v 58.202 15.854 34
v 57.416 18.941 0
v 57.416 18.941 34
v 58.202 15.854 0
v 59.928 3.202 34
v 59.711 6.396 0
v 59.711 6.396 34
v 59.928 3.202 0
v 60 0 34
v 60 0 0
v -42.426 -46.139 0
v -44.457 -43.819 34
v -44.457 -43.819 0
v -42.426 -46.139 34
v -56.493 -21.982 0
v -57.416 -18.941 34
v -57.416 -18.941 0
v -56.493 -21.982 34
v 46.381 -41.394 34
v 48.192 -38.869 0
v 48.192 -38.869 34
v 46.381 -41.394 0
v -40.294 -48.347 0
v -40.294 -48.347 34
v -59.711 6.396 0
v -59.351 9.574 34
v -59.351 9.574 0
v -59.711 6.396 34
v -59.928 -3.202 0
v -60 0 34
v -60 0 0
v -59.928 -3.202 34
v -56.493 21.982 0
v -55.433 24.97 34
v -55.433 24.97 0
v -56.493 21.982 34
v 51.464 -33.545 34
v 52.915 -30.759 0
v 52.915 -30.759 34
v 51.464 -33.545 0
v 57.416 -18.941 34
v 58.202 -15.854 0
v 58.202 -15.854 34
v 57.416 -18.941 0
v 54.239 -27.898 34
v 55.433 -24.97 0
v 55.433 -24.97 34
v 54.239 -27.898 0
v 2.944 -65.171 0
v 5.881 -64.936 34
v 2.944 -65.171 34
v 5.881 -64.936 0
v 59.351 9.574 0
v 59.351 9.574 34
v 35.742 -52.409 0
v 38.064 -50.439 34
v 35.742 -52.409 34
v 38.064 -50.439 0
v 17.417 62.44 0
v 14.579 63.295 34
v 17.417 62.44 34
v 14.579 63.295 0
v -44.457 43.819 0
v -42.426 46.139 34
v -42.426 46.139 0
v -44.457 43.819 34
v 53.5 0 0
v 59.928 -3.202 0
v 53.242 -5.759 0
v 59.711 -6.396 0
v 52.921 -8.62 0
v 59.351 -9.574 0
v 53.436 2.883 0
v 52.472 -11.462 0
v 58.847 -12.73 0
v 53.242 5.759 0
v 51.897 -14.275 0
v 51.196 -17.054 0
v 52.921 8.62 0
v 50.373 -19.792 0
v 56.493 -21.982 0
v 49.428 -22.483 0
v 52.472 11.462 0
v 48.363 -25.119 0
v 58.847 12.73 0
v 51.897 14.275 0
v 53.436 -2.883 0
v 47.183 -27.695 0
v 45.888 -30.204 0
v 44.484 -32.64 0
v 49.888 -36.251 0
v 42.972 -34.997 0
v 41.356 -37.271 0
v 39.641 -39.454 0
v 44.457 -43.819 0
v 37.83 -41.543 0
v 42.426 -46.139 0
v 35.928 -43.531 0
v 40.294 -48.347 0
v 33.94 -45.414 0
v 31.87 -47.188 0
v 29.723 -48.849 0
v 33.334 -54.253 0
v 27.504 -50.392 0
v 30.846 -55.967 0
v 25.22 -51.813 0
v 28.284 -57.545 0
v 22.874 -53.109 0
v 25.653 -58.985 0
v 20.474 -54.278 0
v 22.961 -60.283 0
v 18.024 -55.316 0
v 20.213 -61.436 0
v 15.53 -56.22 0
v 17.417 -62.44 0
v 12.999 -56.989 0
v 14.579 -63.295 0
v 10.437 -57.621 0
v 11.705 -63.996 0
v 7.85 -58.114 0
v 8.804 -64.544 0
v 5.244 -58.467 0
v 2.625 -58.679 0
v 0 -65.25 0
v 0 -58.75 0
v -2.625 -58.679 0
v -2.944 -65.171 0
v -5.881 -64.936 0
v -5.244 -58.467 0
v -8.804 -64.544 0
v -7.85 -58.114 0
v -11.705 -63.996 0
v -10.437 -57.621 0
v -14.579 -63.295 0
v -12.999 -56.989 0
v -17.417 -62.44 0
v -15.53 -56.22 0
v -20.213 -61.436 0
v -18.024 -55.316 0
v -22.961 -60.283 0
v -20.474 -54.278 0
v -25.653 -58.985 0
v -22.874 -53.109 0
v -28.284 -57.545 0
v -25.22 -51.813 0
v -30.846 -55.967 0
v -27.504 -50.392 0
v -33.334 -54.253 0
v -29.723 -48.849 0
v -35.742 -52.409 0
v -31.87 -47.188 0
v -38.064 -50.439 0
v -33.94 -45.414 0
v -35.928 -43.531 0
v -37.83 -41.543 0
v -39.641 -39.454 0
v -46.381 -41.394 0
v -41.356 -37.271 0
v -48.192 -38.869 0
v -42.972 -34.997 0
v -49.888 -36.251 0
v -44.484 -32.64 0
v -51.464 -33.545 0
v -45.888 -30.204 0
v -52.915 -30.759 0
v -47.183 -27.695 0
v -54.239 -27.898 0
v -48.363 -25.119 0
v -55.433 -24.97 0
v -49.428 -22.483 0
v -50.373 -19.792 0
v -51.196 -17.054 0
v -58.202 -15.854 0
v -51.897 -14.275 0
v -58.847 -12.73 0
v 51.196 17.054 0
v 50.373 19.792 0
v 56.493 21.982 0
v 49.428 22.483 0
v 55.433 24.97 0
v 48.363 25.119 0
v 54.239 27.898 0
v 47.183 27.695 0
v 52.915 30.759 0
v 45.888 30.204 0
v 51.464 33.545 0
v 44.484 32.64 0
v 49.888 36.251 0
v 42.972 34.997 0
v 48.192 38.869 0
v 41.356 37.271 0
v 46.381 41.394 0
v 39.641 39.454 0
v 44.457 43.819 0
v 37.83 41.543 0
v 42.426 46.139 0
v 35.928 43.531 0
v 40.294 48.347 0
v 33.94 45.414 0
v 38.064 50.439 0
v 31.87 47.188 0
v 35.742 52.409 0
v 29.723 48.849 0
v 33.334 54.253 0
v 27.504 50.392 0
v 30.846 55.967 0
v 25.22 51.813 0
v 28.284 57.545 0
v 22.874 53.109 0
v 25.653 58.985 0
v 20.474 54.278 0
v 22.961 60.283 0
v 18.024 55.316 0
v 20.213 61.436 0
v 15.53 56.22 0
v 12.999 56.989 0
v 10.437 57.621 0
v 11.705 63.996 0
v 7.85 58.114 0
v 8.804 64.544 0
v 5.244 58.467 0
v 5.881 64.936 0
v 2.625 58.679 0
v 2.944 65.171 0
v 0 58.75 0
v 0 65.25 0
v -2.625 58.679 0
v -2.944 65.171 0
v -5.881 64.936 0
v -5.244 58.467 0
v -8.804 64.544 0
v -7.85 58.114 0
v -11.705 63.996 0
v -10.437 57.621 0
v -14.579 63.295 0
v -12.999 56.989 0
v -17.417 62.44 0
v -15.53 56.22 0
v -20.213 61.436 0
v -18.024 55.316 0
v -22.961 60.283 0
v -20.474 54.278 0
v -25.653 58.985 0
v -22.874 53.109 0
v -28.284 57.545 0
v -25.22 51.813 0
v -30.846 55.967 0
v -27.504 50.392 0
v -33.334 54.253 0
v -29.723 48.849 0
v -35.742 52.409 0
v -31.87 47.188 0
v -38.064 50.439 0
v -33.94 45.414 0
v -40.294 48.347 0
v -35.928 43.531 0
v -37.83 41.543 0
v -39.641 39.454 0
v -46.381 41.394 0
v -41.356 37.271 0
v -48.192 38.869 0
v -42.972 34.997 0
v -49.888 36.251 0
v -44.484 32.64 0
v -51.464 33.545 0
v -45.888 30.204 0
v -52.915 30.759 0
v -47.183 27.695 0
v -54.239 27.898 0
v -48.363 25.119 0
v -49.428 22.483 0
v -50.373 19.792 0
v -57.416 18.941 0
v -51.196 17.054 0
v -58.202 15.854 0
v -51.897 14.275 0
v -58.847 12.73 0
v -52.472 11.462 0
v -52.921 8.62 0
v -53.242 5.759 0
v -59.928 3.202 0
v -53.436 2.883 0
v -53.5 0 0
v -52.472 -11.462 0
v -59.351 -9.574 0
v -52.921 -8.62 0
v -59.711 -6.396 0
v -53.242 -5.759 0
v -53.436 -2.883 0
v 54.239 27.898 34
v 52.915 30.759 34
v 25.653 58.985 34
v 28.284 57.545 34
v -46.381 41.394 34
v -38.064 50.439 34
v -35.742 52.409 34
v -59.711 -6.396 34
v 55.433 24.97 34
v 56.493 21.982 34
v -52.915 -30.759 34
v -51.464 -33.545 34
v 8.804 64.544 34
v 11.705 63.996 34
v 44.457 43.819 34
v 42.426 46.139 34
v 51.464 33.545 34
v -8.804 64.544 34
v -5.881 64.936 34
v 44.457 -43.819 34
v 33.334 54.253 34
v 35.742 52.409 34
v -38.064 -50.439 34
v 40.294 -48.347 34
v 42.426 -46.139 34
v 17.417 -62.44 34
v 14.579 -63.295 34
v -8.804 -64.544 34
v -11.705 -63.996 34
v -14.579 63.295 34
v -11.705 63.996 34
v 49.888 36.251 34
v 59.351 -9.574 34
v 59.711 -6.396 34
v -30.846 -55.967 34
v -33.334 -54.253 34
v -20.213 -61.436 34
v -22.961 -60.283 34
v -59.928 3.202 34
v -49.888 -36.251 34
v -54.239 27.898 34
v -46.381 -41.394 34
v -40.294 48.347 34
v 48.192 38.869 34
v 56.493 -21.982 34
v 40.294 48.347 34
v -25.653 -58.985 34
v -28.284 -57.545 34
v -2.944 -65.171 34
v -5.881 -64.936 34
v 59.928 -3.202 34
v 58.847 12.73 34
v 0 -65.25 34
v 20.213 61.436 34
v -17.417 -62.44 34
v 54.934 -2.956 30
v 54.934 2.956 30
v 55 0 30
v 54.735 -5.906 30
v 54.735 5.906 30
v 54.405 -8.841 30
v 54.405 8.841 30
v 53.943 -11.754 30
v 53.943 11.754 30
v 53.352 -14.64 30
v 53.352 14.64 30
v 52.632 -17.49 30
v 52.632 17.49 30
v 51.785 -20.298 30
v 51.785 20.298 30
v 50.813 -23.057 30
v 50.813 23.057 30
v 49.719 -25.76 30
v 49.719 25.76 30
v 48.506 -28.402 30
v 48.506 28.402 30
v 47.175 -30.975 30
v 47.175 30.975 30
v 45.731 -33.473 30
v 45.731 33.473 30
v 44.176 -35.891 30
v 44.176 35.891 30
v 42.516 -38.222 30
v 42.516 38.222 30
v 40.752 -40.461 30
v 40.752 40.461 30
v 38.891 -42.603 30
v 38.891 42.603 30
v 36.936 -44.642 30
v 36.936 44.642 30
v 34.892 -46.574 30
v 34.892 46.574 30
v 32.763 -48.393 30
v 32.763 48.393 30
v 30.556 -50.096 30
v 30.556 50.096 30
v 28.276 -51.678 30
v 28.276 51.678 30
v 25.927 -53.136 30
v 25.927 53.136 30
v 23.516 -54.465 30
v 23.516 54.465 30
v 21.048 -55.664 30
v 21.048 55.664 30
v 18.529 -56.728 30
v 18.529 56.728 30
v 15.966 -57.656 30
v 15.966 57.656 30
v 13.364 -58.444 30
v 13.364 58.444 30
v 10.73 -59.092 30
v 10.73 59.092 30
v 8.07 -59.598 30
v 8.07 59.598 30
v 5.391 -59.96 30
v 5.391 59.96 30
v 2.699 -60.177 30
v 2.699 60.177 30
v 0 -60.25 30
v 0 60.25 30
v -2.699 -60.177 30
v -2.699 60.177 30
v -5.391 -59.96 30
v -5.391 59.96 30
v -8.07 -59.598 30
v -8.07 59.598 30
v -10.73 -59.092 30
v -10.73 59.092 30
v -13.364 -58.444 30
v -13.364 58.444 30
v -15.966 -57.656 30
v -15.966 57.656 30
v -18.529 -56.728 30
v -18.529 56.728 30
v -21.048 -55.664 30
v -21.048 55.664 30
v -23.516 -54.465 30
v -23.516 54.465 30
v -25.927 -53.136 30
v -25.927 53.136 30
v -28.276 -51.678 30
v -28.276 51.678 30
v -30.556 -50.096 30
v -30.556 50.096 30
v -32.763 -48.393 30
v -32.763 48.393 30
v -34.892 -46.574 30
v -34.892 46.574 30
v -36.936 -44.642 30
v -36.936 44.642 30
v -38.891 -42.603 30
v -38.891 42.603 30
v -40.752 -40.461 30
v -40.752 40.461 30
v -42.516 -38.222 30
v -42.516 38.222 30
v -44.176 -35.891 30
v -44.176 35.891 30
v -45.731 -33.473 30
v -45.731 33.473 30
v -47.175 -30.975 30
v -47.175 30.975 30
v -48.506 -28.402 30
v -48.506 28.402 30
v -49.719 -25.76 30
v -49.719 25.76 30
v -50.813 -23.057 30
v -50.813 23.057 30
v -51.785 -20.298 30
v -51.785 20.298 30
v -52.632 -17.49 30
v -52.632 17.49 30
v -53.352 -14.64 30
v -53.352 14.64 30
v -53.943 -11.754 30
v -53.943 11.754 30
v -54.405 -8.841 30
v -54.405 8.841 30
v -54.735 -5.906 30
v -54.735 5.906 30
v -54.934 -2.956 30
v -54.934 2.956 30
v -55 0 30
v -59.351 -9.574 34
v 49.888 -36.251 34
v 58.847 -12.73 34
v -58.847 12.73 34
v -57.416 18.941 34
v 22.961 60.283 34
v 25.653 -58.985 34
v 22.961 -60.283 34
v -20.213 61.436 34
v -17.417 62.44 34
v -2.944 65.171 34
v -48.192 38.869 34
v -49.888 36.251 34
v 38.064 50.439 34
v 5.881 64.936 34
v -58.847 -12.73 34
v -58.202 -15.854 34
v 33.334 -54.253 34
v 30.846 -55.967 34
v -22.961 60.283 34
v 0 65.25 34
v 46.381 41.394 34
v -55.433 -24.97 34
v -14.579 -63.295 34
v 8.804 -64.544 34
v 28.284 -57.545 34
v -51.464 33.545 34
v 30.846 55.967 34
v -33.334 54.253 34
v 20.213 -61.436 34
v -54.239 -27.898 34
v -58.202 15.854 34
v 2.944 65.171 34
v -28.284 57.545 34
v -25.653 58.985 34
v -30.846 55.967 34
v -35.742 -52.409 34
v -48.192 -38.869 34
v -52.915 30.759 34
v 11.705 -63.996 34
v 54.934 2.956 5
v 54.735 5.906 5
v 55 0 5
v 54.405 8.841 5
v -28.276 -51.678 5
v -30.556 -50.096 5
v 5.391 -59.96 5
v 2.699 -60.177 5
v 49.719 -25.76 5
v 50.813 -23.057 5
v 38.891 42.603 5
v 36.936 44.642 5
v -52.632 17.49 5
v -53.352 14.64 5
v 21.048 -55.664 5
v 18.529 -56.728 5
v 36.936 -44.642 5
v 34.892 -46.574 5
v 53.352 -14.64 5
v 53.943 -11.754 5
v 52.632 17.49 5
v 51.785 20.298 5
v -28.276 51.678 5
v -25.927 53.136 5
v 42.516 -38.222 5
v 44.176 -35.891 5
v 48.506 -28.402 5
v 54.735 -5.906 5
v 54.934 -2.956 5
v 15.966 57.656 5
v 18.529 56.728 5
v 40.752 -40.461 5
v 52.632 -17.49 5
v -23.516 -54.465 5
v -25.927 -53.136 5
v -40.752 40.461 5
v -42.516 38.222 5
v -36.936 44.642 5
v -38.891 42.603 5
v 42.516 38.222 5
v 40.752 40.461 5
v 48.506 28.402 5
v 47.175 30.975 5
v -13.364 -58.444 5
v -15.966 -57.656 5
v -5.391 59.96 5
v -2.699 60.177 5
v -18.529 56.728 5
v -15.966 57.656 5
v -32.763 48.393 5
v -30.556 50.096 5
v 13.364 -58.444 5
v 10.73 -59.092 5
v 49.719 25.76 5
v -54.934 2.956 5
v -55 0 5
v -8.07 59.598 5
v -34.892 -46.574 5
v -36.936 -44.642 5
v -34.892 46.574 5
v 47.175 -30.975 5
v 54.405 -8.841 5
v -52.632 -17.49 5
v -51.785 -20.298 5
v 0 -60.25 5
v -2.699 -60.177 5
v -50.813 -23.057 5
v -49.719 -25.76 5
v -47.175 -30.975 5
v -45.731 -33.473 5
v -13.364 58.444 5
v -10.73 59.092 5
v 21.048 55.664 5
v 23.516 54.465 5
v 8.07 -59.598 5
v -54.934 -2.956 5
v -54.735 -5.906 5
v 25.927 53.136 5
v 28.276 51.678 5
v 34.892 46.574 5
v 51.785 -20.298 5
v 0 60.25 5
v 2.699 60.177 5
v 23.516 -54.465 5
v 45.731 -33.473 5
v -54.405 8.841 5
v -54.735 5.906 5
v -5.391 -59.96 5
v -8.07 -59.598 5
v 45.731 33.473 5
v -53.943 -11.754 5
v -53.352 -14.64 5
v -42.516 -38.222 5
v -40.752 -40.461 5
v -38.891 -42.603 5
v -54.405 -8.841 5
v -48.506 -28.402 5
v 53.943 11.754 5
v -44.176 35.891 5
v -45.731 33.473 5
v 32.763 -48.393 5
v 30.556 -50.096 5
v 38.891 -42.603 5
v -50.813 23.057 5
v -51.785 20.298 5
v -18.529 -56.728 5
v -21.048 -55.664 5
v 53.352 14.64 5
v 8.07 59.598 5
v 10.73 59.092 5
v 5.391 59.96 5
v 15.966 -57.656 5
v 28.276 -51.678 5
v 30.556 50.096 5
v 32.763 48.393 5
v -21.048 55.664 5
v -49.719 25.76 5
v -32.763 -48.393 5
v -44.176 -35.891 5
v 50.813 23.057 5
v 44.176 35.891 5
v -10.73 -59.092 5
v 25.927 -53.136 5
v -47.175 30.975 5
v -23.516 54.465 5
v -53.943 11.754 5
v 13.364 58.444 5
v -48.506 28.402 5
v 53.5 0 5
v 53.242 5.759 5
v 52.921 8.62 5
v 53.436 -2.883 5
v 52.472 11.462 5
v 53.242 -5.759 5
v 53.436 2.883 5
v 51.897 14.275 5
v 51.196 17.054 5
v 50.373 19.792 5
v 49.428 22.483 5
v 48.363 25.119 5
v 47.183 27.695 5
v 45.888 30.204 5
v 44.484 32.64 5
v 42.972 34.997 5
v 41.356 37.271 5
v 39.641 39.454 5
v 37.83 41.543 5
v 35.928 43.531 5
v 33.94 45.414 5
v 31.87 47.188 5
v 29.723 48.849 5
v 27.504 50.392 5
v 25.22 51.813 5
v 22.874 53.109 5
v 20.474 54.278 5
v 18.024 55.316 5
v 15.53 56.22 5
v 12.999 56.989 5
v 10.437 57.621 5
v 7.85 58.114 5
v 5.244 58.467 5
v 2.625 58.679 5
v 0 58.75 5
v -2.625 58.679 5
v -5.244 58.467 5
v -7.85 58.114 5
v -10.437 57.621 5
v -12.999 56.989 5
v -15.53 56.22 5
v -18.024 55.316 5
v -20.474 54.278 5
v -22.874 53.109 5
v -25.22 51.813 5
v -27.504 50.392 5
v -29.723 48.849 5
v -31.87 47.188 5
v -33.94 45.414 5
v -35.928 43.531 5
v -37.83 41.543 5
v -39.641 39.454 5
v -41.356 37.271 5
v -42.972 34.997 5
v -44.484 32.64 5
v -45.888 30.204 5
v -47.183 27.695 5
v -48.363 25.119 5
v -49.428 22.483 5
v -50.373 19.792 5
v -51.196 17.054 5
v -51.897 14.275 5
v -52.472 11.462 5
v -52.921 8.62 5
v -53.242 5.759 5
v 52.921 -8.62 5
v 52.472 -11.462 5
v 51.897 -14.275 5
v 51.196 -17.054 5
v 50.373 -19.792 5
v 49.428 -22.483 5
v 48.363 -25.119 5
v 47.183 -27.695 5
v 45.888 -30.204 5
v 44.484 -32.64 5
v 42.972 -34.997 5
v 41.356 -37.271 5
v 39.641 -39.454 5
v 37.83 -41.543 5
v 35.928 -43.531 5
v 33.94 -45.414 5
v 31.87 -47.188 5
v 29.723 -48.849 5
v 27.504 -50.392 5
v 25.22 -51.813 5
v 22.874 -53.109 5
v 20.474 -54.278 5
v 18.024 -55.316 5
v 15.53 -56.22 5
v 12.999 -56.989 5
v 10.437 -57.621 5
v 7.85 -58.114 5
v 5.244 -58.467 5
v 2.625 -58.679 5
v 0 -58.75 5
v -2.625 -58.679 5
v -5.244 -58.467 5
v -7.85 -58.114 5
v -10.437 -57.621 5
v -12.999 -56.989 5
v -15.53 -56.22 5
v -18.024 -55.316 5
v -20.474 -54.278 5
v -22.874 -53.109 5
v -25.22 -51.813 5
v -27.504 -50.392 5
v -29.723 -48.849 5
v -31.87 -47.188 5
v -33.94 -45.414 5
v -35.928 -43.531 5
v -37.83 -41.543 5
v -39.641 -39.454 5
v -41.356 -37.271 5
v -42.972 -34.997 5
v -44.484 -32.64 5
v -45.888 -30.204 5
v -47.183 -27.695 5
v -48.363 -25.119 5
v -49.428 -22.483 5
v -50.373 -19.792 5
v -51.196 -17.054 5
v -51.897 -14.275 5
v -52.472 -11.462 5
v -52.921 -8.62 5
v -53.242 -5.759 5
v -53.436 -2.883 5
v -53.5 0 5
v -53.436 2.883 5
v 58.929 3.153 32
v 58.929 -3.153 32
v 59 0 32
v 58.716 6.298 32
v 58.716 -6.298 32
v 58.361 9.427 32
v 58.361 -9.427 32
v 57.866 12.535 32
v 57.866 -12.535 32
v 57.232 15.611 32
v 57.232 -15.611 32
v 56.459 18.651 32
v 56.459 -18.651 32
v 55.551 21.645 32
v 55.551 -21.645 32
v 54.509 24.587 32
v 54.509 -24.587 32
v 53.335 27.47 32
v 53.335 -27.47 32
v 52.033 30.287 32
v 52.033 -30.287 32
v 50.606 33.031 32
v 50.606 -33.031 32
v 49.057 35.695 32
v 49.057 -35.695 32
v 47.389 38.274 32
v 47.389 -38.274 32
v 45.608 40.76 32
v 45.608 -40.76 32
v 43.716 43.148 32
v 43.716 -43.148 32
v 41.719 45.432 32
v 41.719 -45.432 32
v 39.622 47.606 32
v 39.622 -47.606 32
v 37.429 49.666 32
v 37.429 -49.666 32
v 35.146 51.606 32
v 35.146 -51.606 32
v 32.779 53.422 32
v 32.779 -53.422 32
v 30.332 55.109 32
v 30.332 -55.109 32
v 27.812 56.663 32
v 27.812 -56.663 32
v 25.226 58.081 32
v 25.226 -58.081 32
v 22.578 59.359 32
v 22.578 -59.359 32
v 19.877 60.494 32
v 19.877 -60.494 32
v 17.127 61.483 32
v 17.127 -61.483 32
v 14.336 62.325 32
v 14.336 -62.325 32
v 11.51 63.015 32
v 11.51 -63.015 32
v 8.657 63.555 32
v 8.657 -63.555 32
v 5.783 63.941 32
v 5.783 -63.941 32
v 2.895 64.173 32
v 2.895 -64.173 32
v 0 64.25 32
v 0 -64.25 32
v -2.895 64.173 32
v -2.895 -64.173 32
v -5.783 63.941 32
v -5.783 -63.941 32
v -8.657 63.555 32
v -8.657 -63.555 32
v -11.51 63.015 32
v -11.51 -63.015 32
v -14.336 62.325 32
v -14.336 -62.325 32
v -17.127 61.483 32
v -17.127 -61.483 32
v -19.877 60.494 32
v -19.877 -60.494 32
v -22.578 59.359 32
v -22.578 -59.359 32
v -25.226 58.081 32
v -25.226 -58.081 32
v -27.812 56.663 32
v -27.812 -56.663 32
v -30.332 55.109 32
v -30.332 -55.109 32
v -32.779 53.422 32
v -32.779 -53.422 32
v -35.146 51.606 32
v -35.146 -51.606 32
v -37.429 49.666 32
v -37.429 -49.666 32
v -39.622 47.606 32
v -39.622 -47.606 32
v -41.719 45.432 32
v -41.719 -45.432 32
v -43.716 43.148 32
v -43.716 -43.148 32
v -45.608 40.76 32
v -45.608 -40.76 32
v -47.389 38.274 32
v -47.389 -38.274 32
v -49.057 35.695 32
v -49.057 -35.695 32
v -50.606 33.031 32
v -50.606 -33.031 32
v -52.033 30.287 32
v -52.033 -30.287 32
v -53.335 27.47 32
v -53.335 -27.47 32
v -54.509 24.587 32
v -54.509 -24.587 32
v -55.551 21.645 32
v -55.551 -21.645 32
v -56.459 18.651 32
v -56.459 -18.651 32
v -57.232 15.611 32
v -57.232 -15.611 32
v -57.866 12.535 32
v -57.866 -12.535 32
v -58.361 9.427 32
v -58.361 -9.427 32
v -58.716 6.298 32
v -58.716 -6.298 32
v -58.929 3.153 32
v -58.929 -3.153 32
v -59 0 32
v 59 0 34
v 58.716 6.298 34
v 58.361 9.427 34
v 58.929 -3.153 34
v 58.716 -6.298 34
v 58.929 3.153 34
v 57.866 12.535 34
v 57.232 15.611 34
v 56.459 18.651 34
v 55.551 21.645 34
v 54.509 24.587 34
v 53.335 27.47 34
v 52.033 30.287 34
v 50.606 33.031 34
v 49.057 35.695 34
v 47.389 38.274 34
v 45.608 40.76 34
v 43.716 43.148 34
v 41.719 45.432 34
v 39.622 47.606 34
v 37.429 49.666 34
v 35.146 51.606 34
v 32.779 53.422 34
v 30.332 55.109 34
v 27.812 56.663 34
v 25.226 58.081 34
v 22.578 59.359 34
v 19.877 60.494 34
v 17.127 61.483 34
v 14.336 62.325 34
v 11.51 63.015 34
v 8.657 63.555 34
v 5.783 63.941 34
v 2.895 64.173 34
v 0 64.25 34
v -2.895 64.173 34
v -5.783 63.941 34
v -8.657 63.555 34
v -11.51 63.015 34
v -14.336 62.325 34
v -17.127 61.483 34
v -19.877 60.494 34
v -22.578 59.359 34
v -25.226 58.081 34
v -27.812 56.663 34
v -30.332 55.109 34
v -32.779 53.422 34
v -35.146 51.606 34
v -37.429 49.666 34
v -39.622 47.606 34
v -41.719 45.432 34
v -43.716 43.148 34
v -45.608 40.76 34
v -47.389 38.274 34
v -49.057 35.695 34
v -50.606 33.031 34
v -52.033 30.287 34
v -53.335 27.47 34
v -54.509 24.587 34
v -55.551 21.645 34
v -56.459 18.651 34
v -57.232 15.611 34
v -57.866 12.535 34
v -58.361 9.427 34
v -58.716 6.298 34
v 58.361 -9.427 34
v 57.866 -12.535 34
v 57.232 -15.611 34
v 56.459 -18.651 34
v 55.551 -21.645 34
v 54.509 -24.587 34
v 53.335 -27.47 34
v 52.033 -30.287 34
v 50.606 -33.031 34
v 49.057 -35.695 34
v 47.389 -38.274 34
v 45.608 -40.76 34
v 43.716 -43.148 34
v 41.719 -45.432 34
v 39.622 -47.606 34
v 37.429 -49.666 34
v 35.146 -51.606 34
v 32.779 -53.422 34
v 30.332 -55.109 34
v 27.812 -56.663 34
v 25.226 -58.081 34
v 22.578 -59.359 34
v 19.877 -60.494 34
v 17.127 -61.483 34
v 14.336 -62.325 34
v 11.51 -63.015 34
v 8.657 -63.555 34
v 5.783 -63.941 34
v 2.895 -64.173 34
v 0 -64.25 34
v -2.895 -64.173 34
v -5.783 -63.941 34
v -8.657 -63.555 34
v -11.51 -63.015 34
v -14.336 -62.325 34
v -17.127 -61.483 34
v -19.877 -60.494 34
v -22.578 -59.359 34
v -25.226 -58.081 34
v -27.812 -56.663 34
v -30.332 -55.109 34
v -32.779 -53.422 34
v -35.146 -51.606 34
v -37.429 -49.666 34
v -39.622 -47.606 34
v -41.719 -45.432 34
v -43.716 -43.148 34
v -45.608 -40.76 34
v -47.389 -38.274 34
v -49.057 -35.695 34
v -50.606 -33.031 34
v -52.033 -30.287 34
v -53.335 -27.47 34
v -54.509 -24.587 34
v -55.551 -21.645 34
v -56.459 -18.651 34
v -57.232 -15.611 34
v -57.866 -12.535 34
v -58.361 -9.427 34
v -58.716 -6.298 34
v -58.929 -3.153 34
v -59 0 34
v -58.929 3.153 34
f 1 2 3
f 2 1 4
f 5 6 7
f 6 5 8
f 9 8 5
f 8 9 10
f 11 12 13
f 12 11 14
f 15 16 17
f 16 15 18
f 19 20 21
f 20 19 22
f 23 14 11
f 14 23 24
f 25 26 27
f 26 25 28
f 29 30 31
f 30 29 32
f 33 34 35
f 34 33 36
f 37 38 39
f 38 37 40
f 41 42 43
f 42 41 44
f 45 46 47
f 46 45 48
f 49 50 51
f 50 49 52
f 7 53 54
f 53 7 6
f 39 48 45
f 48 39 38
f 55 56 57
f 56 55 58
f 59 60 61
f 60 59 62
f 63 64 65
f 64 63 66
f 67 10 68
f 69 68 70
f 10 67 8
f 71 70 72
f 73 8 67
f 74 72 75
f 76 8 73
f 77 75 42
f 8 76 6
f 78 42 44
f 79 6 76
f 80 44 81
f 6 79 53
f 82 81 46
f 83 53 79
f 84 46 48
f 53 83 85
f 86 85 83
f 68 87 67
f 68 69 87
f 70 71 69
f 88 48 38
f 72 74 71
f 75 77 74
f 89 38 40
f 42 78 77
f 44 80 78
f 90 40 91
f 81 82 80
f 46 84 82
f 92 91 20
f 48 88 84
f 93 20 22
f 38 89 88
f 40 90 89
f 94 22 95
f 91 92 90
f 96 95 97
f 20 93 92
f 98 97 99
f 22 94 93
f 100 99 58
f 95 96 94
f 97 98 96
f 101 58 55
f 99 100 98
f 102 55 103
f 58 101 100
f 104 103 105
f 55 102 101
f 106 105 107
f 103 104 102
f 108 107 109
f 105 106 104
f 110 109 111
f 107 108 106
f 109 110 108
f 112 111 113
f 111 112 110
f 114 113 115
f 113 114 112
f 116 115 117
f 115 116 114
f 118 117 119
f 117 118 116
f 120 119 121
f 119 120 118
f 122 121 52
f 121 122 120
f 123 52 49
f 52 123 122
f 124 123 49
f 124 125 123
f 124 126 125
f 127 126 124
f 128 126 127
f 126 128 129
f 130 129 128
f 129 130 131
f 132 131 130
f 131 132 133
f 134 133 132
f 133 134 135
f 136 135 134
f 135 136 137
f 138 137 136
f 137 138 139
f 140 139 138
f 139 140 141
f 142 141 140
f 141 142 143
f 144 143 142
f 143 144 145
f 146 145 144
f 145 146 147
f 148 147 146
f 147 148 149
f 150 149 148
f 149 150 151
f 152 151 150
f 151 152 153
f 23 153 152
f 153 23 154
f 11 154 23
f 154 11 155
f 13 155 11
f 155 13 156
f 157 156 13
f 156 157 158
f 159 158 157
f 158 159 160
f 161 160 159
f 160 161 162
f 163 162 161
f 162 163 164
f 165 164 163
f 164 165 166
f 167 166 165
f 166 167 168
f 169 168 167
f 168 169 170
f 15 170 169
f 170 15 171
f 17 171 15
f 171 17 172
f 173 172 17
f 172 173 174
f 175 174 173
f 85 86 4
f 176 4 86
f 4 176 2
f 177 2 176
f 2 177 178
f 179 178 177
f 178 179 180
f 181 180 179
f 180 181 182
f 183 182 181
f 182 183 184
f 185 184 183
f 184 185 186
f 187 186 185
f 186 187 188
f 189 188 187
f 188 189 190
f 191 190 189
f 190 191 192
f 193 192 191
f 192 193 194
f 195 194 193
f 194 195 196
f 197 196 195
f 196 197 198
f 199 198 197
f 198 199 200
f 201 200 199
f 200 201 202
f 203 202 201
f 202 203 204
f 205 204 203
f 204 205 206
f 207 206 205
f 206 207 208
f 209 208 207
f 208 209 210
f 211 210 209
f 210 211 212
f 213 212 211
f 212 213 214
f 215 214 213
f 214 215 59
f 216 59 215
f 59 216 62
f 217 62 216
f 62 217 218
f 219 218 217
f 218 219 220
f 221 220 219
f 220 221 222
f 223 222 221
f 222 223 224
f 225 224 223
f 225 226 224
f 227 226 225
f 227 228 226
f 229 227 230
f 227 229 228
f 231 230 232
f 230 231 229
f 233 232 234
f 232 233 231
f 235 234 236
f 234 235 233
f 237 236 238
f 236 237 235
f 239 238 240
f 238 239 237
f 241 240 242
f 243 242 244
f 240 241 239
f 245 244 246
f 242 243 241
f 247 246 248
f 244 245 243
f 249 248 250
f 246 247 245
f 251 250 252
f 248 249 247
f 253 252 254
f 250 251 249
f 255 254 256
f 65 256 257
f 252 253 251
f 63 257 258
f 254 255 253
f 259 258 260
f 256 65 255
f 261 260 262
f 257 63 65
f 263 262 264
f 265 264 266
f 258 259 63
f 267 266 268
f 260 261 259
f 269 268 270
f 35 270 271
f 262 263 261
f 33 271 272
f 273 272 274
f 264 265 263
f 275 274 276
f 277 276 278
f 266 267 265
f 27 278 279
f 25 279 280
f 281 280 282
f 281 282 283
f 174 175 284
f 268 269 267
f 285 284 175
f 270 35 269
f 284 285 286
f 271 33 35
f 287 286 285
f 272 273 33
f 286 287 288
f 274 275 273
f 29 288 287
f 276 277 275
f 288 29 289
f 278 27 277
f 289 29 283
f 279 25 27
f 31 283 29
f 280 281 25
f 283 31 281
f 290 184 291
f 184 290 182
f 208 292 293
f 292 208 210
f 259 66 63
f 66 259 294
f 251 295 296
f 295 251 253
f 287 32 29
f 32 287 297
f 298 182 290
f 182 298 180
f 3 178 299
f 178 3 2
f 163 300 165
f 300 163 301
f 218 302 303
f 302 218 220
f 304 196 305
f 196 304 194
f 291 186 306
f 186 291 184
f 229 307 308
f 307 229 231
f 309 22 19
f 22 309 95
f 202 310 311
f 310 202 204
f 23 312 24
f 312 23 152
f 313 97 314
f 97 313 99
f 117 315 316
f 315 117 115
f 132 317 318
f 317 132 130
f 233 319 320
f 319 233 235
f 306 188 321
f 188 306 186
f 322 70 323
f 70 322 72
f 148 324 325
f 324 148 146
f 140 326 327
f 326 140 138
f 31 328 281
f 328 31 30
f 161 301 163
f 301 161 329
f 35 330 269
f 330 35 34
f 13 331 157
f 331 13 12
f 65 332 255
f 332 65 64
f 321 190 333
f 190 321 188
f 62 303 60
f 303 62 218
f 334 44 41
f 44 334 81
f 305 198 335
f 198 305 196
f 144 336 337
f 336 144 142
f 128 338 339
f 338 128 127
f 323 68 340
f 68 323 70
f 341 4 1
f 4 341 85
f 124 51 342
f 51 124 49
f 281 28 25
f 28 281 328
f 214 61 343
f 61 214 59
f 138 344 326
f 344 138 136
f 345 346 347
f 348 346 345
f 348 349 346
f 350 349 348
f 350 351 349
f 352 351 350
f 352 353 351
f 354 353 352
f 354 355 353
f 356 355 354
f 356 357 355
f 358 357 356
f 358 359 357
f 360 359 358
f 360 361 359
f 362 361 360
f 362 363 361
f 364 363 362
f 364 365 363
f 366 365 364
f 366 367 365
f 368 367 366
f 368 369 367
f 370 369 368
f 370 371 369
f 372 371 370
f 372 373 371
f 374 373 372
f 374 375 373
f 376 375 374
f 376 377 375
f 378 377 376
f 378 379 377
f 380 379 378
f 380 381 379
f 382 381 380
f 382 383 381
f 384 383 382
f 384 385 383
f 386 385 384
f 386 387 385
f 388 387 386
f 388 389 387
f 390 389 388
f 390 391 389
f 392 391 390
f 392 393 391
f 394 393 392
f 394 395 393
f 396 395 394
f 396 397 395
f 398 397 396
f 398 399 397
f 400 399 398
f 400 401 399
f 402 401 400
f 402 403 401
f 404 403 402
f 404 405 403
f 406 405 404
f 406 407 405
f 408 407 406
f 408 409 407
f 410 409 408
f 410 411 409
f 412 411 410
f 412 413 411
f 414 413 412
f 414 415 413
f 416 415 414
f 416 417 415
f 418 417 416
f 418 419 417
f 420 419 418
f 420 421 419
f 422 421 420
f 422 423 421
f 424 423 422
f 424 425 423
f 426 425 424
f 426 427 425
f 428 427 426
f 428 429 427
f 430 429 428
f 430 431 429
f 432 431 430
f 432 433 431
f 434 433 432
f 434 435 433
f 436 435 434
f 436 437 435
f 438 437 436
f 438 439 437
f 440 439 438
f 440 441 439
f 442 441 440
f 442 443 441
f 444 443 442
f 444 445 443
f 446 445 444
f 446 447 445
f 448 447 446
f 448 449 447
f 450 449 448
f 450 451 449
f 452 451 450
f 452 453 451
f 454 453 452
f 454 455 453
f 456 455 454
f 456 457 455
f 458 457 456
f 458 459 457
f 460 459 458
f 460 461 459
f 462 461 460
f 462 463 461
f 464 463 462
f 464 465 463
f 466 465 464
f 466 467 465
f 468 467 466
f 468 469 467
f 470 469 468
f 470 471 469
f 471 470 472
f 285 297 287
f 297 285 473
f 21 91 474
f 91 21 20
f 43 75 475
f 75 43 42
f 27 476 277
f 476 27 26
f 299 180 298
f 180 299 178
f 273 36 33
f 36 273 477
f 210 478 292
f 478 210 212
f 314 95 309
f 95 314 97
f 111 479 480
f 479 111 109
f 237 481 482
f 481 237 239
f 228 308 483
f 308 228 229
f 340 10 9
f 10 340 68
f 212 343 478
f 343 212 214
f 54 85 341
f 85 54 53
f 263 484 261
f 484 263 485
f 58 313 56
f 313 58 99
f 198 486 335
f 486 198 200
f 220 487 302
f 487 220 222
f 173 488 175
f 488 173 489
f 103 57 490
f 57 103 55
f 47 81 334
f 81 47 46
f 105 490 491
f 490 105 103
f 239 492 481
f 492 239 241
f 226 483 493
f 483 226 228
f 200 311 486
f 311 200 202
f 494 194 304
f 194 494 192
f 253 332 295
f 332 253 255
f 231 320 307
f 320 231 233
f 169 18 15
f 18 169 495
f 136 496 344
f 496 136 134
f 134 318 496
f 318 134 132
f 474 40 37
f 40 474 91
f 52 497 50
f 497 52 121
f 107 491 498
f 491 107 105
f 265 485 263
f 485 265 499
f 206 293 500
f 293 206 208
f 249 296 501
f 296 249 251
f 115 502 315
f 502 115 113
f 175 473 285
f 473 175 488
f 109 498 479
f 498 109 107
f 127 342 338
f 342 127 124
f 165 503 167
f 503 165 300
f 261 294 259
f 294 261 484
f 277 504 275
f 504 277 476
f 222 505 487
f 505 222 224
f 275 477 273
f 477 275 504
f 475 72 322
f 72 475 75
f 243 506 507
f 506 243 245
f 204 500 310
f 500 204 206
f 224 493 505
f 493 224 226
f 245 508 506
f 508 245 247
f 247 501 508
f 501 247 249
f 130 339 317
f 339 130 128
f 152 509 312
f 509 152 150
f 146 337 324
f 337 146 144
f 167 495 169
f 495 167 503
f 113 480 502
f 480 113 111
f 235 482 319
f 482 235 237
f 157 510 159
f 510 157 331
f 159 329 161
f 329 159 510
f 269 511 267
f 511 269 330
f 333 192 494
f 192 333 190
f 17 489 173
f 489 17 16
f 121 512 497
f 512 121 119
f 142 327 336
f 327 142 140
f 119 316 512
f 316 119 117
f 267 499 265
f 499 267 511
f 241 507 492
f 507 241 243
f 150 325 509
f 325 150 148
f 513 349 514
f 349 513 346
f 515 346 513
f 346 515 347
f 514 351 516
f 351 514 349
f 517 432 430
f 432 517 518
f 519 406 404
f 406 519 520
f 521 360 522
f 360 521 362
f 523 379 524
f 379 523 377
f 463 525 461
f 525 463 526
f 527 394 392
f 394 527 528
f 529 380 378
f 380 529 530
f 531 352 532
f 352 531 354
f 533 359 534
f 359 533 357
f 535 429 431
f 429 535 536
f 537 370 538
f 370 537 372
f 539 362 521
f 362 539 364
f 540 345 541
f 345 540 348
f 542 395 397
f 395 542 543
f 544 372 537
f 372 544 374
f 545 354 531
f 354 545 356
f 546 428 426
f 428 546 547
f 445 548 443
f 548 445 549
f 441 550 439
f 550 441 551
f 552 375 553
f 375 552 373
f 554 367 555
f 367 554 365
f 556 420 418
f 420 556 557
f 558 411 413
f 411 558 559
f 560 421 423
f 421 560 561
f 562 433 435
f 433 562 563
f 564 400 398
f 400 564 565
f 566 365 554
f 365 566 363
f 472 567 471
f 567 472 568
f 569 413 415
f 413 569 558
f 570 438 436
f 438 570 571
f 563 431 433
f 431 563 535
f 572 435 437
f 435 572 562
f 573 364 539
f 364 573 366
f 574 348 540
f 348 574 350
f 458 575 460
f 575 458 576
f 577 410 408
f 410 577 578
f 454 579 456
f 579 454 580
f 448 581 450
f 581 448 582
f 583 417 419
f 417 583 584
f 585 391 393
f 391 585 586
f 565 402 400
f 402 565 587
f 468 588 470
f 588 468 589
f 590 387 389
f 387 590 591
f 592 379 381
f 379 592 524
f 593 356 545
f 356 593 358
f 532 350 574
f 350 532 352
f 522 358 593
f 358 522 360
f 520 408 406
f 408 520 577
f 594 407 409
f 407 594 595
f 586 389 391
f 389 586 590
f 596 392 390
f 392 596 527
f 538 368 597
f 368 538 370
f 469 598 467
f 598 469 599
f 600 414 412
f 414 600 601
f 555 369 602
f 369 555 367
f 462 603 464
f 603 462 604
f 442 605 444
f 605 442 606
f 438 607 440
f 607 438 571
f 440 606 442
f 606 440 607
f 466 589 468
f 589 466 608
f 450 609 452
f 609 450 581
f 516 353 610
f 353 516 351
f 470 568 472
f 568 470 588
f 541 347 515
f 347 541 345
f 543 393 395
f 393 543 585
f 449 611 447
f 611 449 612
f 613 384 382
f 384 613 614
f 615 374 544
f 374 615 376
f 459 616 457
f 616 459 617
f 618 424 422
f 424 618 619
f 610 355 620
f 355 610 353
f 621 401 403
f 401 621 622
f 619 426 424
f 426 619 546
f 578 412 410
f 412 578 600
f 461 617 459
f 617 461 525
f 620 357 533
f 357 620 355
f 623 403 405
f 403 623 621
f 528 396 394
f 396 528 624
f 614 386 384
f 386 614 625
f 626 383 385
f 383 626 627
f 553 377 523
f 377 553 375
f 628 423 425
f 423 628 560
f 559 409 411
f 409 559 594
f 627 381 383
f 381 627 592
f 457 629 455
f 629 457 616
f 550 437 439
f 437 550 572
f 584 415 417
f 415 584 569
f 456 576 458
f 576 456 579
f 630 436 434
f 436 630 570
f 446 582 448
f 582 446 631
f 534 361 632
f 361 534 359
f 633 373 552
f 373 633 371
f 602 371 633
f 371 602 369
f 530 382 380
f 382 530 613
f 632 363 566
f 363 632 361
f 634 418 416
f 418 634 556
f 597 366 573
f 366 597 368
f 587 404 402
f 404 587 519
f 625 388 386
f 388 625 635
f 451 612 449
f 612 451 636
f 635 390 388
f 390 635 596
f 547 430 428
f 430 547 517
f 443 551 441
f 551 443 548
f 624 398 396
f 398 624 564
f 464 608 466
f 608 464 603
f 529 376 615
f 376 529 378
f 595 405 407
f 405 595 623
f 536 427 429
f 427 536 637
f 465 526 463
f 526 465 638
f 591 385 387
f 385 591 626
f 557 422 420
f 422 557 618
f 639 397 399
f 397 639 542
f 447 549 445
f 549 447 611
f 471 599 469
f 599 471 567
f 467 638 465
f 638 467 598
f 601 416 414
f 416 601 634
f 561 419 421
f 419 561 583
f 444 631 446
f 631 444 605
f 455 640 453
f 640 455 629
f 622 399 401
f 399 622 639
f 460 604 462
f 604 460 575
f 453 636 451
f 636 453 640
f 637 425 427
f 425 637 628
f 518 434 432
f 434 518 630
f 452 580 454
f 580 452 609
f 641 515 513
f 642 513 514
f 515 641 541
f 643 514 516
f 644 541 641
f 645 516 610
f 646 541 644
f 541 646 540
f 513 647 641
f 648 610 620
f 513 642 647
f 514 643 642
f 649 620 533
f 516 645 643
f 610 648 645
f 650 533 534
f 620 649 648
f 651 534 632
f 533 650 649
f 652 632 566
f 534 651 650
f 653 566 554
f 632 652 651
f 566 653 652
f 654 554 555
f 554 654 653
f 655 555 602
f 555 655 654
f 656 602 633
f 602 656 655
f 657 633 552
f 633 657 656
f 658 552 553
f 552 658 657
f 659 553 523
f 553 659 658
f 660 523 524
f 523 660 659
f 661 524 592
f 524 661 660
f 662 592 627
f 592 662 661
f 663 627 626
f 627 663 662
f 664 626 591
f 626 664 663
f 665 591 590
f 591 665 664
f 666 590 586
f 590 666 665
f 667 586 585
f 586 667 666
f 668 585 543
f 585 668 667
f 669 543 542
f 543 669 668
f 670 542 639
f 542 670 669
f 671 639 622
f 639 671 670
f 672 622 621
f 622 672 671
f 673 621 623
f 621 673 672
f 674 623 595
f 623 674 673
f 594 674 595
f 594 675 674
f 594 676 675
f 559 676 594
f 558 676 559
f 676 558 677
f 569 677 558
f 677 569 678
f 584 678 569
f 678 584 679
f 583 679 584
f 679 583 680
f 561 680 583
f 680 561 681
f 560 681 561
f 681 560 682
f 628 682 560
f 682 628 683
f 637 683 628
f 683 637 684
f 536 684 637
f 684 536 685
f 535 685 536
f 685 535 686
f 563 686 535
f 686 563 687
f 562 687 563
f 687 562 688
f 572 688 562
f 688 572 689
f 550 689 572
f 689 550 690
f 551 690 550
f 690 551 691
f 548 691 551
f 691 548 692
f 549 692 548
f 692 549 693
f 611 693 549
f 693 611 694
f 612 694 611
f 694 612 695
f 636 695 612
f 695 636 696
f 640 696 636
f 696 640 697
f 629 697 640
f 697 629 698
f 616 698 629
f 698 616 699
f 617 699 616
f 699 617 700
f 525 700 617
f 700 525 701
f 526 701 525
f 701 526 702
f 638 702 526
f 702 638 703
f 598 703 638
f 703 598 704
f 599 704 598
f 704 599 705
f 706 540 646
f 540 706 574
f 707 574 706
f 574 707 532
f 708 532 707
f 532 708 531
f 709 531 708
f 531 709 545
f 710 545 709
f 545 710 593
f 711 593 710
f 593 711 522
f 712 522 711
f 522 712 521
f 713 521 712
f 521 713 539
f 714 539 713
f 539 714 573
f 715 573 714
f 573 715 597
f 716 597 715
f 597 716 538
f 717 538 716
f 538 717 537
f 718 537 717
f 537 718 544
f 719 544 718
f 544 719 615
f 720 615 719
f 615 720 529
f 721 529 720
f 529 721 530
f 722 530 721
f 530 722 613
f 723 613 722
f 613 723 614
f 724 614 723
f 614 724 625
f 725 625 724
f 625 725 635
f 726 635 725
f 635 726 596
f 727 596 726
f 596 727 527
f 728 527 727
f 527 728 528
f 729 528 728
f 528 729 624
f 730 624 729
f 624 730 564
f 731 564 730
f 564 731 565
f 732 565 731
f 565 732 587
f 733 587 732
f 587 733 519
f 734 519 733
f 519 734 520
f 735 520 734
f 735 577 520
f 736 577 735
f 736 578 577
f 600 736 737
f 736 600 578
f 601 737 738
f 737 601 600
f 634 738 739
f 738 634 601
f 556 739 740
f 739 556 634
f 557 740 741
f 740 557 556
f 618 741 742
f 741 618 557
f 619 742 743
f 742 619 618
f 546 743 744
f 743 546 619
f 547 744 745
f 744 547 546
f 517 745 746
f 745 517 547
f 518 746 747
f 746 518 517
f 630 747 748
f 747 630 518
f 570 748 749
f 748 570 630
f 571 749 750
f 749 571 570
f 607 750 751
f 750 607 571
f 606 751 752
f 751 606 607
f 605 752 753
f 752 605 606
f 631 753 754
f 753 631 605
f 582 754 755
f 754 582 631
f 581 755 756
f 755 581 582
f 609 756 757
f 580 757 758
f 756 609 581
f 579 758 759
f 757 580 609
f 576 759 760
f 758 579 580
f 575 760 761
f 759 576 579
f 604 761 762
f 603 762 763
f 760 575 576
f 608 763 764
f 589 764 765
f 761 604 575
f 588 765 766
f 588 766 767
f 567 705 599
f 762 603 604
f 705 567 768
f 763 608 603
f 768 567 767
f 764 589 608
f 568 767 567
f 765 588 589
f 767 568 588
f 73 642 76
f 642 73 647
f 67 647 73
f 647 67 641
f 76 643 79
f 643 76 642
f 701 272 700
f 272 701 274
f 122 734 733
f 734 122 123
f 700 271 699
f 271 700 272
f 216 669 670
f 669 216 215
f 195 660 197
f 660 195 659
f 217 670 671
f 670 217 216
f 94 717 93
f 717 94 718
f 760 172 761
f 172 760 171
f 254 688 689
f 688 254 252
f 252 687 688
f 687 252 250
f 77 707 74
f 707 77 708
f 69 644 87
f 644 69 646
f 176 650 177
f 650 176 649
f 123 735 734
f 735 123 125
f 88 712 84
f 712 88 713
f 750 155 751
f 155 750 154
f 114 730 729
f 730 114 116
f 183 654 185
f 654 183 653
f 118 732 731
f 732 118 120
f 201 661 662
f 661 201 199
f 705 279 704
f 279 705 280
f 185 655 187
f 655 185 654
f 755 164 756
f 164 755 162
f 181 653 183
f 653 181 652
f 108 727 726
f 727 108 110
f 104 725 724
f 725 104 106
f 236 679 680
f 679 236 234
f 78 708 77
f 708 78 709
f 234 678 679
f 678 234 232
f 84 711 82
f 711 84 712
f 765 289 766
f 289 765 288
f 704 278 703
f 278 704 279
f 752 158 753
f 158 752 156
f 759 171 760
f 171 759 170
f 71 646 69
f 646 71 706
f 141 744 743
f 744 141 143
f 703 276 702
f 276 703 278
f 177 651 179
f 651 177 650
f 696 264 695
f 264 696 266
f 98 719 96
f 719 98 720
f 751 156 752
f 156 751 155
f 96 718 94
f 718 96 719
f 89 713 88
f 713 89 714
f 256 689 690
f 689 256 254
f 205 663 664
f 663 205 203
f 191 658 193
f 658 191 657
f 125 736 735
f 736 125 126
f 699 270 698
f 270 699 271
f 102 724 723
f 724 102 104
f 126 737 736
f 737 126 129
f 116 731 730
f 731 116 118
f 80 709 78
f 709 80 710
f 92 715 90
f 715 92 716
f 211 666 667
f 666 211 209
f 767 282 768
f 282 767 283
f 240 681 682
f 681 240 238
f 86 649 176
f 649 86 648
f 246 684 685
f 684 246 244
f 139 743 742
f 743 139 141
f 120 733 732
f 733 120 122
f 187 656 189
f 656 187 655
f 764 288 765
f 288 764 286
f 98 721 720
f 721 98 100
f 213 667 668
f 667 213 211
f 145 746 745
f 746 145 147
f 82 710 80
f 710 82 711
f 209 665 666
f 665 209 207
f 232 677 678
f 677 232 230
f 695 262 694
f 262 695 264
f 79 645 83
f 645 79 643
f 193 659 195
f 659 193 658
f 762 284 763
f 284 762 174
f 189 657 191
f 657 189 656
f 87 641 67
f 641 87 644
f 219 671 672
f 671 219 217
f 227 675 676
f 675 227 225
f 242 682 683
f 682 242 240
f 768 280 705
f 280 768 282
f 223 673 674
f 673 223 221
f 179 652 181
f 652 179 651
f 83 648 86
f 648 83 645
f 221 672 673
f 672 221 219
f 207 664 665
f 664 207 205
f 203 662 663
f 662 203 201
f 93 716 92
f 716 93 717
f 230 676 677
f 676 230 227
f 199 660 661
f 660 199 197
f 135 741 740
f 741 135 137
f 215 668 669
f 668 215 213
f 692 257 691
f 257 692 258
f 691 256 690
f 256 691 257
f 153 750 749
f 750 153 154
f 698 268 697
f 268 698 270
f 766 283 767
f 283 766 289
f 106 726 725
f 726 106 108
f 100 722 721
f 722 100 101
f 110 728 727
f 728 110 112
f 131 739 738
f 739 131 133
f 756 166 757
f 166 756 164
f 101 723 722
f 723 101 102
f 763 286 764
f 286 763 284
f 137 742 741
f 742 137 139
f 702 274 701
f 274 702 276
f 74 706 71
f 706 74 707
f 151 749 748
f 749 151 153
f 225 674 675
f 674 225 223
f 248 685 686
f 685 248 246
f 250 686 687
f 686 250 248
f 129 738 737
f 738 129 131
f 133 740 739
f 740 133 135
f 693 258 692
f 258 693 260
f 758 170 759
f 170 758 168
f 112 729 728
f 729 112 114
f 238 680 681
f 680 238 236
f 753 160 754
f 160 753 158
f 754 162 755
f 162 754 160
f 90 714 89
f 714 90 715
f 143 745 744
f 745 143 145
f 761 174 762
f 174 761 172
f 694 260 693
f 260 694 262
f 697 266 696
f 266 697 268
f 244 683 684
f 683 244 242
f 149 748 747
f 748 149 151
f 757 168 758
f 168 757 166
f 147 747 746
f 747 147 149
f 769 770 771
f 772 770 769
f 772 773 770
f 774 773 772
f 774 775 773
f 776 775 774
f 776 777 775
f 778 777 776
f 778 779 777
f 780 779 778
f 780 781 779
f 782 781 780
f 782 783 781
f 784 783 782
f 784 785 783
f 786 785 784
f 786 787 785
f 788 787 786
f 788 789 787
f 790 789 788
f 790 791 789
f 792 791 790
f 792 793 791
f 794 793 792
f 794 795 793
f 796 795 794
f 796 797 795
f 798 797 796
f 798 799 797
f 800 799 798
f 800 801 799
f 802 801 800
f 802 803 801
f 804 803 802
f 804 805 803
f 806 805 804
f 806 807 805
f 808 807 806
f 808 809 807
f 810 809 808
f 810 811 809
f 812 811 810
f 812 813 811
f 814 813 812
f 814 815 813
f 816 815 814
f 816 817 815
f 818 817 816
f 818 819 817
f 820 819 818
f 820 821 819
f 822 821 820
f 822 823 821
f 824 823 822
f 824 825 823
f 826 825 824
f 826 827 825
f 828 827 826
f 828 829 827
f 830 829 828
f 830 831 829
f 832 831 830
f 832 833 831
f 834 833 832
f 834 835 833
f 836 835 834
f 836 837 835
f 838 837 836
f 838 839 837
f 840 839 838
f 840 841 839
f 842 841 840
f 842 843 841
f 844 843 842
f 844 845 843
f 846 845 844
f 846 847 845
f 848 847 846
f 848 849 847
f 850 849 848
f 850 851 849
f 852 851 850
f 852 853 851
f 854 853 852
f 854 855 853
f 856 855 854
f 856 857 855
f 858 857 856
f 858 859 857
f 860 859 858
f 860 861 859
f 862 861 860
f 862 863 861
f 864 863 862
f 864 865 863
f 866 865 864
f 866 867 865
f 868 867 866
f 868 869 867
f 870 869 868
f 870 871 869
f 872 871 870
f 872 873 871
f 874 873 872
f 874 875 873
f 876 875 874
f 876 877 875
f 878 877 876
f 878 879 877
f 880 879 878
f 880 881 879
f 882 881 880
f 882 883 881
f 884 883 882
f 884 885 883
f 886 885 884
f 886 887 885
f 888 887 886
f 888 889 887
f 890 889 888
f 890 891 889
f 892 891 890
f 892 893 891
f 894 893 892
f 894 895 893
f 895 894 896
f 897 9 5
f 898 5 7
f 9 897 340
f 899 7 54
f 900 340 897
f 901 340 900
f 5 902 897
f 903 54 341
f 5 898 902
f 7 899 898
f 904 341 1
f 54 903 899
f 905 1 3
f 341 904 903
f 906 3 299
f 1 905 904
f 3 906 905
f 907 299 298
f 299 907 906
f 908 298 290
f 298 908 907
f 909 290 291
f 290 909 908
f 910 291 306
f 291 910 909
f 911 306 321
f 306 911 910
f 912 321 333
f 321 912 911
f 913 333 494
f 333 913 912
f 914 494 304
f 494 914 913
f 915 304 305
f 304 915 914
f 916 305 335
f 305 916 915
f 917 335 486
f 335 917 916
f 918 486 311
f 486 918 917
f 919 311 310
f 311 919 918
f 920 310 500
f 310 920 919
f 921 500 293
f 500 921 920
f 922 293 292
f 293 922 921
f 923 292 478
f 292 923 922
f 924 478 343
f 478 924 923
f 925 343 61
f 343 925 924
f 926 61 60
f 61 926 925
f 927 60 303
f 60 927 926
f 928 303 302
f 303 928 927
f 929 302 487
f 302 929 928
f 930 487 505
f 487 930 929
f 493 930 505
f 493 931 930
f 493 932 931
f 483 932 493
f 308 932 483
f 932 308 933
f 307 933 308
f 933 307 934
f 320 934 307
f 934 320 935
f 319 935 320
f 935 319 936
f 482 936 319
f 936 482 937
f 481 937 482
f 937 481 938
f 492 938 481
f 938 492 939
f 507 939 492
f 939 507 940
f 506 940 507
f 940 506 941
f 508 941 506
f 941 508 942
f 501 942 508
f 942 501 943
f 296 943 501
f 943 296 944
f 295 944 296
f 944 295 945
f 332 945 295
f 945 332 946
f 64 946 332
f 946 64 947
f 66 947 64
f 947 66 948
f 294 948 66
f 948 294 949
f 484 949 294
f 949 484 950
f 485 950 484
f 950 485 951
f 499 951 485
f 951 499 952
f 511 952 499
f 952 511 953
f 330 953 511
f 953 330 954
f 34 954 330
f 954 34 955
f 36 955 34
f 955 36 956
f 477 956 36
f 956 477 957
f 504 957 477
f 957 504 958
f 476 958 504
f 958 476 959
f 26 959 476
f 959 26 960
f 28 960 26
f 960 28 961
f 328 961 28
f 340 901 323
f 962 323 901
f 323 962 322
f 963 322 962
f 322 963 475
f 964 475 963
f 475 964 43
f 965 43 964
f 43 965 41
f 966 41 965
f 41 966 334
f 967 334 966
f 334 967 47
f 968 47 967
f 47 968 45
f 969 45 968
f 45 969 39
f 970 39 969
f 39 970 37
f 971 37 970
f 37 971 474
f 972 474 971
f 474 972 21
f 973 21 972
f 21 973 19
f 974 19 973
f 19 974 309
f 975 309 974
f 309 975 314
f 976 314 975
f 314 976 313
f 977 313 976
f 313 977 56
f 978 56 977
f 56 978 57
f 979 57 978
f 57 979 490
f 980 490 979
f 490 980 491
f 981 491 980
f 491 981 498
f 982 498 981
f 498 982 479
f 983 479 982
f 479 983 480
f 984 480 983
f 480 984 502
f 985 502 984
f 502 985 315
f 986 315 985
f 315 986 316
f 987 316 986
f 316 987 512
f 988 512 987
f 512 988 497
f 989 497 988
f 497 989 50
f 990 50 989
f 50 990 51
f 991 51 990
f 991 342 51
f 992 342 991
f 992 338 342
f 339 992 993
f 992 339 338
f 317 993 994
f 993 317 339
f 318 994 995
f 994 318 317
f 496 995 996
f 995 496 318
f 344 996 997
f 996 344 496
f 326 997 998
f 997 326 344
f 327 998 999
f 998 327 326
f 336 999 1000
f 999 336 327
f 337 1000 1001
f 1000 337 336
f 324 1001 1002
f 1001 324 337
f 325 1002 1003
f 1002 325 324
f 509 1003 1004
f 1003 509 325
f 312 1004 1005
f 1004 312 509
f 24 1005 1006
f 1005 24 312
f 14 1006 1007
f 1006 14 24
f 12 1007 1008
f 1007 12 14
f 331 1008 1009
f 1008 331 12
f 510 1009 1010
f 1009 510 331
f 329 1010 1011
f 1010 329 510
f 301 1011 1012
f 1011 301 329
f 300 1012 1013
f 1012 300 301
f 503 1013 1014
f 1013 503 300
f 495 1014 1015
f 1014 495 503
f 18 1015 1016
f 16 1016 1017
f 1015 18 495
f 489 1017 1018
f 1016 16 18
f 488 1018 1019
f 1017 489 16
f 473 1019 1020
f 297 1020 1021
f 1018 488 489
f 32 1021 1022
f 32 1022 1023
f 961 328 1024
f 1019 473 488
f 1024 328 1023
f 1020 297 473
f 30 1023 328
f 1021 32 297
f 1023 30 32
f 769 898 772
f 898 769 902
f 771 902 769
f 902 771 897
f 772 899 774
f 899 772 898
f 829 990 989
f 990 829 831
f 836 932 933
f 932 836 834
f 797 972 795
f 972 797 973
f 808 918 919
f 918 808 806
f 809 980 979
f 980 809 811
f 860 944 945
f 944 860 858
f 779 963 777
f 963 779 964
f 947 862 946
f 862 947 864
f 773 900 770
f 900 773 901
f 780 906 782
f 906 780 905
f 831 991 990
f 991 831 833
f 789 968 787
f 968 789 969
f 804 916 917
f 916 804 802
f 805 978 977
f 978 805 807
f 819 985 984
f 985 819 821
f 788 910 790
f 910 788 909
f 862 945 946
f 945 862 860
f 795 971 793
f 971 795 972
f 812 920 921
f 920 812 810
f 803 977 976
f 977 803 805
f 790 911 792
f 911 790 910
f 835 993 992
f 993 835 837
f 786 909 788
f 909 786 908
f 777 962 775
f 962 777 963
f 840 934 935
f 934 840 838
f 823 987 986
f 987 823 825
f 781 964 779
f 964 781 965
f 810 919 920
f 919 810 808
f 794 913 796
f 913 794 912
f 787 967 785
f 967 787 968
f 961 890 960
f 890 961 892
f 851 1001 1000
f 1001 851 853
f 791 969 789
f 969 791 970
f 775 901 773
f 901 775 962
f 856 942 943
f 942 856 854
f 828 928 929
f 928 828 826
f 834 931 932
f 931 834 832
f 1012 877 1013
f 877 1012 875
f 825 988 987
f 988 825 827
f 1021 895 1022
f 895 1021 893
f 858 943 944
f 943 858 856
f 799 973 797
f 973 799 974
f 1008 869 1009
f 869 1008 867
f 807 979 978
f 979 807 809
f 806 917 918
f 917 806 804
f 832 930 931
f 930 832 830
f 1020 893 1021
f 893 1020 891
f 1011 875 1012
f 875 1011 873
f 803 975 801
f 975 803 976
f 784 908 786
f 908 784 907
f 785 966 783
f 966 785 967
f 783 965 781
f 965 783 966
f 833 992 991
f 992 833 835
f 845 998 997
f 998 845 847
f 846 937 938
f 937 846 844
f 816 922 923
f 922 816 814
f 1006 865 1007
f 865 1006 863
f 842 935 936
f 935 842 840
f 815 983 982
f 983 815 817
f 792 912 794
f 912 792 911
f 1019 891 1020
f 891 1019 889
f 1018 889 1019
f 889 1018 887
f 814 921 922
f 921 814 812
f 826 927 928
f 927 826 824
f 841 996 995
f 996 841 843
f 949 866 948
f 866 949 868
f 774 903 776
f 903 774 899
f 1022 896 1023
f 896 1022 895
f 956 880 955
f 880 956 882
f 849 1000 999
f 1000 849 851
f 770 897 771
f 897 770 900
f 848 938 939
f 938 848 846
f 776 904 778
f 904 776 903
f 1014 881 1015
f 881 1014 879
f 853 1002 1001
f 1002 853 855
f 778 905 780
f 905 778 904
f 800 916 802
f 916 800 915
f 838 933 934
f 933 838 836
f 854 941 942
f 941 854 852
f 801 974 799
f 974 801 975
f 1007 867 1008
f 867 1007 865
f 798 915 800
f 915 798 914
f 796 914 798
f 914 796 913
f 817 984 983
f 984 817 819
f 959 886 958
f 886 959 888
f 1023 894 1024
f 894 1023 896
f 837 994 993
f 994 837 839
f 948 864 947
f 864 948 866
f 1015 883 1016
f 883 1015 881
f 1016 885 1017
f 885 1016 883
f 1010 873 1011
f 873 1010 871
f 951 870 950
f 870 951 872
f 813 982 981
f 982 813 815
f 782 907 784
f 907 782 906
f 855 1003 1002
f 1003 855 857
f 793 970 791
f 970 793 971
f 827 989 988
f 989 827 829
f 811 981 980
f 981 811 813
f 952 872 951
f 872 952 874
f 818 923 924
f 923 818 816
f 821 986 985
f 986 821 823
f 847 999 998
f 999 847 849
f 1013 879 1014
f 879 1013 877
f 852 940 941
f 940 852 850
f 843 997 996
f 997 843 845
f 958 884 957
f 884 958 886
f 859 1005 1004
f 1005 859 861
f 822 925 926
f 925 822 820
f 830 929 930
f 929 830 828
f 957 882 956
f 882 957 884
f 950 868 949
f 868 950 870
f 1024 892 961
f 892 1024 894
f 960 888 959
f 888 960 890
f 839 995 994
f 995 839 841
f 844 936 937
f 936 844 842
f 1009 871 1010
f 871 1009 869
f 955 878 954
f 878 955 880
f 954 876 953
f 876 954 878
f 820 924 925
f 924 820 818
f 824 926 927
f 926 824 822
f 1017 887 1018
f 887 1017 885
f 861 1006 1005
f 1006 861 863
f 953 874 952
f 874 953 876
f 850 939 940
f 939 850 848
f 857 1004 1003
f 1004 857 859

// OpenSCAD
// ============================================================
//  PIECE 2 — Oval Cylinder + Tray
//  Sonos Era 100 Isolation Stand
//  Material: PETG — 240°C nozzle, 75°C bed
//  Print upside-down (tray face on build plate), no supports
// ============================================================

$fn = 128;

// ── Speaker base footprint (Era 100) ─────────────────────────
SPK_W            = 120.0;   // width
SPK_D            = 130.5;   // depth

// ── Oval cylinder dimensions ──────────────────────────────────
// Outer ellipse matches speaker base exactly
CYL_A            = SPK_W / 2;        // semi-axis X = 60mm
CYL_B            = SPK_D / 2;        // semi-axis Y = 65.25mm
CYL_WALL         = 5.0;              // 5mm wall thickness
CYL_H            = 30.0;             // 3cm tall

// Inner ellipse (hollow interior)
CYL_A_IN         = CYL_A - CYL_WALL;
CYL_B_IN         = CYL_B - CYL_WALL;

// ── Tray plate ────────────────────────────────────────────────
TRAY_THICK       = 2.0;    // 2mm flat top plate
LIP_H            = 2.0;    // raised lip height
LIP_T            = 1.0;    // lip thickness

// ── Spring outer ring interface (press-fit collar) ────────────
// Outer ring of scaled spring: inner r ~53mm oval, outer r ~60/65mm
// Collar sits at bottom of cylinder, grips spring outer ring
COLLAR_H         = 5.0;    // how deep the collar grips the spring
COLLAR_EXTRA     = 1.5;    // collar is slightly thicker for grip

// ── Scaled spring reference (for sizing collar) ───────────────
// Original spring outer ring: r 64–72.4mm circular
// Scaled to oval 120x130.5: outer edge IS the cylinder outer wall
// Collar inner matches spring outer ring inner edge
COLLAR_A_IN      = CYL_A_IN - COLLAR_EXTRA;
COLLAR_B_IN      = CYL_B_IN - COLLAR_EXTRA;

// ── Helper: oval prism via scale on cylinder ──────────────────
module oval_solid(a, b, h) {
    scale([1, b/a, 1]) cylinder(r=a, h=h);
}

module oval_shell(a_out, b_out, a_in, b_in, h) {
    difference() {
        oval_solid(a_out, b_out, h);
        translate([0, 0, -0.01])
            oval_solid(a_in, b_in, h + 0.02);
    }
}

// ── Tray Z reference ──────────────────────────────────────────
// Tray plate at top: z = CYL_H to CYL_H + TRAY_THICK
// Lip above that:    z = CYL_H + TRAY_THICK to CYL_H + TRAY_THICK + LIP_H

union() {

    // 1. Oval cylinder walls
    oval_shell(CYL_A, CYL_B, CYL_A_IN, CYL_B_IN, CYL_H);

    // 2. Thickened press-fit collar at bottom (grips spring outer ring)
    oval_shell(CYL_A, CYL_B, COLLAR_A_IN, COLLAR_B_IN, COLLAR_H);

    // 3. Tray top plate — solid oval disc
    translate([0, 0, CYL_H])
        oval_solid(CYL_A, CYL_B, TRAY_THICK);

    // 4. Raised perimeter lip on tray
    //    Outer lip edge = tray outer edge
    //    Inner lip edge = tray outer - LIP_T
    translate([0, 0, CYL_H + TRAY_THICK])
        oval_shell(
            CYL_A,        CYL_B,
            CYL_A - LIP_T, CYL_B - LIP_T,
            LIP_H
        );
}

// ── PRINT NOTES ───────────────────────────────────────────────
// Orientation : UPSIDE DOWN (tray plate on build plate)
//               This puts the collar at the top during printing
//               and avoids overhangs on the tray underside
// Supports    : none needed in this orientation
// Infill      : 15% gyroid
// PETG        : 240°C / 75°C bed / 3 perimeters
// After print : press collar down over spring outer ring
//               Spring sits inside collar, gripped by friction
